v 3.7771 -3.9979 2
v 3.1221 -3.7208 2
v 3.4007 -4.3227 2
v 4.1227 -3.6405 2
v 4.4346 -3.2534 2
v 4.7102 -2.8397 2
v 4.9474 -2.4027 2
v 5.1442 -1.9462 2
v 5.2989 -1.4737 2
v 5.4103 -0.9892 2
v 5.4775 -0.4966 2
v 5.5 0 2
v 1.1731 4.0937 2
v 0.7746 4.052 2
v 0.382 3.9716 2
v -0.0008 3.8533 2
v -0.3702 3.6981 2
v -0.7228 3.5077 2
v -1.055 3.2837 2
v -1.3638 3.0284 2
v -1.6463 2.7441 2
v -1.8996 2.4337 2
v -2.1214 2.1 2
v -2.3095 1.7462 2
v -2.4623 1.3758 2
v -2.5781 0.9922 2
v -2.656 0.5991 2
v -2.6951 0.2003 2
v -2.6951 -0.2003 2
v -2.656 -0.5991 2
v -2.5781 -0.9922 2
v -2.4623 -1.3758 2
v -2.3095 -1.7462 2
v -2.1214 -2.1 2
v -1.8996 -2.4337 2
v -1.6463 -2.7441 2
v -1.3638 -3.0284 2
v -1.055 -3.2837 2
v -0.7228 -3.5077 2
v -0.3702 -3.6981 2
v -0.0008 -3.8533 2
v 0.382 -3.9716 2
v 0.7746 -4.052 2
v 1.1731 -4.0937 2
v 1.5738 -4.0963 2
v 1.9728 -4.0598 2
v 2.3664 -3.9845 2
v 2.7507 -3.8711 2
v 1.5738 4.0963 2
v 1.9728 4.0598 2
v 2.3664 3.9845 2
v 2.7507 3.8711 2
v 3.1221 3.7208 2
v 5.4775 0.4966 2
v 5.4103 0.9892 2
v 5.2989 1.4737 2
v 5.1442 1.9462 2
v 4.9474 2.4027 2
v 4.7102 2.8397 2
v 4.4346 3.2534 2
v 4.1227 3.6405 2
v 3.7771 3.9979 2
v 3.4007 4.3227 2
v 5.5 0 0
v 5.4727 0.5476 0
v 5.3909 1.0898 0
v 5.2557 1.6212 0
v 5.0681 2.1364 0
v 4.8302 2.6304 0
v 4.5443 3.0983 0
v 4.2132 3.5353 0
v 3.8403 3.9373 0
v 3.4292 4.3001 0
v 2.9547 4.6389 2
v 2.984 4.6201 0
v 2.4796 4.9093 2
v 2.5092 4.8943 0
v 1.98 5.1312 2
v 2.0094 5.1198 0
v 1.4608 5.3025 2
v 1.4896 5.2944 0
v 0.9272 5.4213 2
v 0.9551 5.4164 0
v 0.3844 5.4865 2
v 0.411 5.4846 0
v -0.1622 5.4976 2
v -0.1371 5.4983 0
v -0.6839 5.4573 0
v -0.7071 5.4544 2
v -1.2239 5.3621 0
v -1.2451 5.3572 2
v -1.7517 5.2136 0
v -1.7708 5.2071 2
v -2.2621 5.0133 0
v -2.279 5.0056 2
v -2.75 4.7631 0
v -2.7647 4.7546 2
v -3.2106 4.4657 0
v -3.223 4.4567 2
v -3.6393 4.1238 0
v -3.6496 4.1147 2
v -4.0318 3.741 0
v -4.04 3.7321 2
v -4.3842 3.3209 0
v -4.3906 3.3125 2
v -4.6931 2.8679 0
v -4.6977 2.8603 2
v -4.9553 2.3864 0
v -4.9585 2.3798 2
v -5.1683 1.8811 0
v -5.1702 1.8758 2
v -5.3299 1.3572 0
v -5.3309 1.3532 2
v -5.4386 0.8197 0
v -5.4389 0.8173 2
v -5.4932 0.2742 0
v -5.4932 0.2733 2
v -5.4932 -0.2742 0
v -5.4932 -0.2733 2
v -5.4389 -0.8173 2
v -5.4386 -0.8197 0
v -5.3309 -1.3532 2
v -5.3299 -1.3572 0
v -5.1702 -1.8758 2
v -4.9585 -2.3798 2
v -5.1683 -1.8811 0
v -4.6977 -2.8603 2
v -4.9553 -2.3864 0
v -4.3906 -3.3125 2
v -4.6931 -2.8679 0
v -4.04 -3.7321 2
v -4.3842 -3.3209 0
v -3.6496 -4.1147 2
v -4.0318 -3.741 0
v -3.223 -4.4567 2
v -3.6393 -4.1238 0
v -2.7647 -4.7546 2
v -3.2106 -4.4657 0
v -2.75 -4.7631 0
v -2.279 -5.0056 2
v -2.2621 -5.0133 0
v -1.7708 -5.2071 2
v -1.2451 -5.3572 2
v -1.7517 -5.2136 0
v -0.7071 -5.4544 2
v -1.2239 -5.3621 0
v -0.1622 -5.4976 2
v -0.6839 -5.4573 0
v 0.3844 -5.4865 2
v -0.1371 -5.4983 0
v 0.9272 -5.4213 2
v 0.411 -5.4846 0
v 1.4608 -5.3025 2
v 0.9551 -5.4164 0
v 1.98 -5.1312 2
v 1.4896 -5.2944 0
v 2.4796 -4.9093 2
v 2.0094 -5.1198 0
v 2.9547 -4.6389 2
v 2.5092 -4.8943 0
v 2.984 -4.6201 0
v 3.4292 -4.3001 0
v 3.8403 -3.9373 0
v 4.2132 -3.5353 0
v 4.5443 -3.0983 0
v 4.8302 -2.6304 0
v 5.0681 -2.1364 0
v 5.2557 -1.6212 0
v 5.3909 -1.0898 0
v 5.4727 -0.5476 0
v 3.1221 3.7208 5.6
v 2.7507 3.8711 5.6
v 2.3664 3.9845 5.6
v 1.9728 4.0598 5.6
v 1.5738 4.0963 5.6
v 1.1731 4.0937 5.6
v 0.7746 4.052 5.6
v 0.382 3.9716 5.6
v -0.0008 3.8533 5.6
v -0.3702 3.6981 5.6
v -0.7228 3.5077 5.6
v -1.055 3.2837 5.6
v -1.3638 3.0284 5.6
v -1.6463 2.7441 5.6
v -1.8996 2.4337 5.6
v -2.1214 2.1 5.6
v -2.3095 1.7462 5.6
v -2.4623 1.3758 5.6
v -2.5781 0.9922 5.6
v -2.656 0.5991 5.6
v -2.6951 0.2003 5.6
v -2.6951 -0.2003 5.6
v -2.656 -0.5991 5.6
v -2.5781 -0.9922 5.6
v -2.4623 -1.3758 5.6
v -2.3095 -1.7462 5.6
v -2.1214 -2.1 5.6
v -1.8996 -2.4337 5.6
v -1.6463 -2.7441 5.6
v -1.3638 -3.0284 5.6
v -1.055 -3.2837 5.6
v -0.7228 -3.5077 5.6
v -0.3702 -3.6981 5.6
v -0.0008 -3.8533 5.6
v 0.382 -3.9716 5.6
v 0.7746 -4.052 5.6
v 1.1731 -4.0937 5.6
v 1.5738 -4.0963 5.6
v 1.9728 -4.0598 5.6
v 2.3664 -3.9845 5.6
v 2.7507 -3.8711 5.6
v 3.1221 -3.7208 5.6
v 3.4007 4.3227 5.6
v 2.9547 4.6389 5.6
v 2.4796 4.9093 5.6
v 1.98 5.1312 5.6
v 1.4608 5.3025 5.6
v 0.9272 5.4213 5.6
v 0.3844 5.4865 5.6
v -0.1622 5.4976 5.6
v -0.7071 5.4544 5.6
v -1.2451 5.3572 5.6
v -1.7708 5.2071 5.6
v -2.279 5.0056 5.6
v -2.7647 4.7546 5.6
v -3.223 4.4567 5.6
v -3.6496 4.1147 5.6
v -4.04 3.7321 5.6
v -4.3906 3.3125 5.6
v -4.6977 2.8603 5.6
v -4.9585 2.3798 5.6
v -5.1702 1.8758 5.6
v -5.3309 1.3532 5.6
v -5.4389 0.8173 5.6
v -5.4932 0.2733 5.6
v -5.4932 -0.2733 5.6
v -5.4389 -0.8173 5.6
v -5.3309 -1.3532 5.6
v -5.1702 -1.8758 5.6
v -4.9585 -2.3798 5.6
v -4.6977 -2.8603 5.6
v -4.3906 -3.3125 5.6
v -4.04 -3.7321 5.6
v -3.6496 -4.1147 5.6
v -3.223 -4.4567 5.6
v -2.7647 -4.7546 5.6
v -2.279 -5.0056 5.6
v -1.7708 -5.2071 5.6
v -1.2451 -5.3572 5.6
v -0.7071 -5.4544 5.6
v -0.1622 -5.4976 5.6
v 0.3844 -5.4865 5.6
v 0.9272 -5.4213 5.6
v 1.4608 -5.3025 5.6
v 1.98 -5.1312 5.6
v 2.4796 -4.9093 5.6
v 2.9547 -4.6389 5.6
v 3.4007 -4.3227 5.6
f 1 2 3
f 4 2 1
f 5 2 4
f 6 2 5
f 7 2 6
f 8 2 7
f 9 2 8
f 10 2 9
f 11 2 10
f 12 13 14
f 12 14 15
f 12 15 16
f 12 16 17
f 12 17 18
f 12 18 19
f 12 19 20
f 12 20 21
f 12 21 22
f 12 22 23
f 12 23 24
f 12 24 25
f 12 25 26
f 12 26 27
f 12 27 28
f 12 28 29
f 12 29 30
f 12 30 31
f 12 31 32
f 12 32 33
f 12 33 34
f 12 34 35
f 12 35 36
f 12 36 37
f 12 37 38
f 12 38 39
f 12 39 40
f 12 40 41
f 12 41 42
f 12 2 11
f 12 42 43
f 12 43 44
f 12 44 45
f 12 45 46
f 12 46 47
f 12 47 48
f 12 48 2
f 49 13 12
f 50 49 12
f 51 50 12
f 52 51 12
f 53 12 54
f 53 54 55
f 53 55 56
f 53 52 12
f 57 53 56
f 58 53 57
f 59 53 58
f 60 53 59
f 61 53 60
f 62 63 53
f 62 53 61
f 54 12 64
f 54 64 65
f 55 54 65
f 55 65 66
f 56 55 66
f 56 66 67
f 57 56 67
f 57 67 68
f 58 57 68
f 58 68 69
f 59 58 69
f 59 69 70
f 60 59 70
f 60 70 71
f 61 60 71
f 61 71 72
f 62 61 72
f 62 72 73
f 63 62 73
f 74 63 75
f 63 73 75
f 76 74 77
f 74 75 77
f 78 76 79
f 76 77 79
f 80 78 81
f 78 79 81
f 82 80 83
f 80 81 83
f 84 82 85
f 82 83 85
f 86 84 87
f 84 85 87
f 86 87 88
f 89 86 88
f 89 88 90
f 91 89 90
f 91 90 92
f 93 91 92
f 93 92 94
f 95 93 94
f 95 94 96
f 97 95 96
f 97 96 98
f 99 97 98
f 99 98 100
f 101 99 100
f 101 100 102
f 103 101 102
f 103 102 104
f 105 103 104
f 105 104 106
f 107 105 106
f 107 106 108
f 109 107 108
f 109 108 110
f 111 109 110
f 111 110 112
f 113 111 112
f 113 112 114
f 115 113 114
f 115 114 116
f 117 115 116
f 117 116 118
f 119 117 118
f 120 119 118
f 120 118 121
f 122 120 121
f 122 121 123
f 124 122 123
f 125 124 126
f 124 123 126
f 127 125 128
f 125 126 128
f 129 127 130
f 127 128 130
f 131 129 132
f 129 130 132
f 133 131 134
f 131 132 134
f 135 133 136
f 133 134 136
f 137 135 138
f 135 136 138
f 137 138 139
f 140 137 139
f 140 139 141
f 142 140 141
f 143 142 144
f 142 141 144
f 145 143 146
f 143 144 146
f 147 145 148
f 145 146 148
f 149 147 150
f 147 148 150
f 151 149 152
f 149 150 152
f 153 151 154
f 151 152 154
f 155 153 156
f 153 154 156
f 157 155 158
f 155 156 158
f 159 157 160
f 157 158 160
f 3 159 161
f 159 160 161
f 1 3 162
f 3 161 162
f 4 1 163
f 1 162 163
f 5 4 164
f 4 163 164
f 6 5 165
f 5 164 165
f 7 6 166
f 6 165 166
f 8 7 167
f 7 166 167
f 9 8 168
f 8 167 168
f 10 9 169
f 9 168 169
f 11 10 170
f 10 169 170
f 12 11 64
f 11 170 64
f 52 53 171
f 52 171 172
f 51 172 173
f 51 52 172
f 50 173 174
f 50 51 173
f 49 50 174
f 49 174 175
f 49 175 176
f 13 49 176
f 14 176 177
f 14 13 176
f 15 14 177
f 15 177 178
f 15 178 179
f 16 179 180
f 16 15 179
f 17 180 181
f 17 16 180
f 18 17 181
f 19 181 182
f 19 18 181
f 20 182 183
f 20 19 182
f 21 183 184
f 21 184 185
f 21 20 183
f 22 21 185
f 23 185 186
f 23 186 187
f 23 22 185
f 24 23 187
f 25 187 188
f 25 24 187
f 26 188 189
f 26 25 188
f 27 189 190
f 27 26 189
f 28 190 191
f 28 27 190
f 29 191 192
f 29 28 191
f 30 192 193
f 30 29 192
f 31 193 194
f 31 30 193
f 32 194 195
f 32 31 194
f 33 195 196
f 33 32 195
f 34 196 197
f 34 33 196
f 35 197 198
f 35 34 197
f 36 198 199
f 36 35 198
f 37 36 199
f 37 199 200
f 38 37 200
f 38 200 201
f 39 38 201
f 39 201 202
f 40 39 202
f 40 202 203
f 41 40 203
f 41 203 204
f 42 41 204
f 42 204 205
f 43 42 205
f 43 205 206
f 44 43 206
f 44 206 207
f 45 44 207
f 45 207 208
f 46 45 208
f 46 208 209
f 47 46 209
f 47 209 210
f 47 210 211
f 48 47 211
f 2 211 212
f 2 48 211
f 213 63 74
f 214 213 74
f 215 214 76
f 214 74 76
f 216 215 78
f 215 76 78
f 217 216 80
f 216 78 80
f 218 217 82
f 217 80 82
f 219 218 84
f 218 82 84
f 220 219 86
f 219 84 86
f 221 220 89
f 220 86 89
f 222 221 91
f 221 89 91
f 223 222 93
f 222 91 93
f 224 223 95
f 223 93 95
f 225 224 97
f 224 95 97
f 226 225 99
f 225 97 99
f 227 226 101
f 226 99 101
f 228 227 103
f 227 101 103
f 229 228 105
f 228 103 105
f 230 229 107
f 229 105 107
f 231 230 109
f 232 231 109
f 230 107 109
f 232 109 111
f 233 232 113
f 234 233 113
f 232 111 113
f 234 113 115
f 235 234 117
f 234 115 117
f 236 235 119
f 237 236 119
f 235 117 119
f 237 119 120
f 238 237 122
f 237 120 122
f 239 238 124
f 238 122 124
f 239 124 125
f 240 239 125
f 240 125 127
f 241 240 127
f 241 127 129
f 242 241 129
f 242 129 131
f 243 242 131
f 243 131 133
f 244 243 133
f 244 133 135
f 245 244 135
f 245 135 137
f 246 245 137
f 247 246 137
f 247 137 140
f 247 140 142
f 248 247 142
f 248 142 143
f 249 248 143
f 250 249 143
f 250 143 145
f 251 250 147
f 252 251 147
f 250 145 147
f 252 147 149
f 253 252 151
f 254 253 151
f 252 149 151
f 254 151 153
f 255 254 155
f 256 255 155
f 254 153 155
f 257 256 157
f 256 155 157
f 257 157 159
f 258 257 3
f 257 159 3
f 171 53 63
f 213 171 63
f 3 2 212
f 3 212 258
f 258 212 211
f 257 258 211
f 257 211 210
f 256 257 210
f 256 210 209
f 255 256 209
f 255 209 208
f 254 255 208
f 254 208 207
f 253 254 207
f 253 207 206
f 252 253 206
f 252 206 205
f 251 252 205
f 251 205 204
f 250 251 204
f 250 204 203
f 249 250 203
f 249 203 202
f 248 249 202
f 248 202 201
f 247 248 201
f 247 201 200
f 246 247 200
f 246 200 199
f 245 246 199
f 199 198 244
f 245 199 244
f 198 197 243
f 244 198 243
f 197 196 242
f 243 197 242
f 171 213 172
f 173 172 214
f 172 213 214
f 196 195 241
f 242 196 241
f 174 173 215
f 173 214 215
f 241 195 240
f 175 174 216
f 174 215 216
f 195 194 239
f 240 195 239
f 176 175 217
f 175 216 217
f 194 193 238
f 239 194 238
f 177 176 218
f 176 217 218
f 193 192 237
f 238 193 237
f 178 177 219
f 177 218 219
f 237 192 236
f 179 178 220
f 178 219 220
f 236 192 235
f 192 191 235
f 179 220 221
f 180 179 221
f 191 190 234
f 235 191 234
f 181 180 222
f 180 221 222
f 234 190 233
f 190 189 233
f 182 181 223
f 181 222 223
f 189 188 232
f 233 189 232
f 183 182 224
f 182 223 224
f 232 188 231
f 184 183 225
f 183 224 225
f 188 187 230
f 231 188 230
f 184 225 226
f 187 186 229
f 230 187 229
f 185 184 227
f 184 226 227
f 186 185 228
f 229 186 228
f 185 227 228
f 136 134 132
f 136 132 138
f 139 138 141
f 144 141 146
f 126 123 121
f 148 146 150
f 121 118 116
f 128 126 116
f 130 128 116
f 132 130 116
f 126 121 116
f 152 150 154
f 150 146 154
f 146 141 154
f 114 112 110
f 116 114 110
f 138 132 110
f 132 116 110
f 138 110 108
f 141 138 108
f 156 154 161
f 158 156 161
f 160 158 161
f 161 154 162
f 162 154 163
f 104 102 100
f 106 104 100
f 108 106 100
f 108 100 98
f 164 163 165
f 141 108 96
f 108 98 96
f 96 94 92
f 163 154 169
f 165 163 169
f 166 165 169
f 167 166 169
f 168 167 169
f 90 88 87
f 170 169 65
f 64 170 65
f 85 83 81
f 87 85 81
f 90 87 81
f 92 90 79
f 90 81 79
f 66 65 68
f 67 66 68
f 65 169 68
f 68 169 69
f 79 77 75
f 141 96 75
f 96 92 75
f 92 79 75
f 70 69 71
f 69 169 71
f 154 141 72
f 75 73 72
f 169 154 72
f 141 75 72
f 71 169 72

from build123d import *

# Parameters (mm, degrees)
SKETCH_R     = 5.5
PAD_DEPTH    = 2
PAD001_DEPTH = 3.6


with BuildPart() as part:
    # Sketch → Pad (new body)
    with BuildSketch(Plane.XY):
        Circle(SKETCH_R)
    extrude(amount=PAD_DEPTH)

    # Sketch001 (on Face3 of Pad) → Pad001 (join)
    with BuildSketch(Plane.XY.offset(2)):
        with BuildLine():
            ThreePointArc((3.122117, 3.720795), (-2.7, 0), (3.122117, -3.720795))
            Line((3.122117, -3.720795), (3.400681, -4.322658))
            ThreePointArc((3.400681, 4.322658), (-5.5, 0), (3.400681, -4.322658))
            Line((3.122117, 3.720795), (3.400681, 4.322658))
        make_face()
    extrude(amount=PAD001_DEPTH)


solid = part.part
